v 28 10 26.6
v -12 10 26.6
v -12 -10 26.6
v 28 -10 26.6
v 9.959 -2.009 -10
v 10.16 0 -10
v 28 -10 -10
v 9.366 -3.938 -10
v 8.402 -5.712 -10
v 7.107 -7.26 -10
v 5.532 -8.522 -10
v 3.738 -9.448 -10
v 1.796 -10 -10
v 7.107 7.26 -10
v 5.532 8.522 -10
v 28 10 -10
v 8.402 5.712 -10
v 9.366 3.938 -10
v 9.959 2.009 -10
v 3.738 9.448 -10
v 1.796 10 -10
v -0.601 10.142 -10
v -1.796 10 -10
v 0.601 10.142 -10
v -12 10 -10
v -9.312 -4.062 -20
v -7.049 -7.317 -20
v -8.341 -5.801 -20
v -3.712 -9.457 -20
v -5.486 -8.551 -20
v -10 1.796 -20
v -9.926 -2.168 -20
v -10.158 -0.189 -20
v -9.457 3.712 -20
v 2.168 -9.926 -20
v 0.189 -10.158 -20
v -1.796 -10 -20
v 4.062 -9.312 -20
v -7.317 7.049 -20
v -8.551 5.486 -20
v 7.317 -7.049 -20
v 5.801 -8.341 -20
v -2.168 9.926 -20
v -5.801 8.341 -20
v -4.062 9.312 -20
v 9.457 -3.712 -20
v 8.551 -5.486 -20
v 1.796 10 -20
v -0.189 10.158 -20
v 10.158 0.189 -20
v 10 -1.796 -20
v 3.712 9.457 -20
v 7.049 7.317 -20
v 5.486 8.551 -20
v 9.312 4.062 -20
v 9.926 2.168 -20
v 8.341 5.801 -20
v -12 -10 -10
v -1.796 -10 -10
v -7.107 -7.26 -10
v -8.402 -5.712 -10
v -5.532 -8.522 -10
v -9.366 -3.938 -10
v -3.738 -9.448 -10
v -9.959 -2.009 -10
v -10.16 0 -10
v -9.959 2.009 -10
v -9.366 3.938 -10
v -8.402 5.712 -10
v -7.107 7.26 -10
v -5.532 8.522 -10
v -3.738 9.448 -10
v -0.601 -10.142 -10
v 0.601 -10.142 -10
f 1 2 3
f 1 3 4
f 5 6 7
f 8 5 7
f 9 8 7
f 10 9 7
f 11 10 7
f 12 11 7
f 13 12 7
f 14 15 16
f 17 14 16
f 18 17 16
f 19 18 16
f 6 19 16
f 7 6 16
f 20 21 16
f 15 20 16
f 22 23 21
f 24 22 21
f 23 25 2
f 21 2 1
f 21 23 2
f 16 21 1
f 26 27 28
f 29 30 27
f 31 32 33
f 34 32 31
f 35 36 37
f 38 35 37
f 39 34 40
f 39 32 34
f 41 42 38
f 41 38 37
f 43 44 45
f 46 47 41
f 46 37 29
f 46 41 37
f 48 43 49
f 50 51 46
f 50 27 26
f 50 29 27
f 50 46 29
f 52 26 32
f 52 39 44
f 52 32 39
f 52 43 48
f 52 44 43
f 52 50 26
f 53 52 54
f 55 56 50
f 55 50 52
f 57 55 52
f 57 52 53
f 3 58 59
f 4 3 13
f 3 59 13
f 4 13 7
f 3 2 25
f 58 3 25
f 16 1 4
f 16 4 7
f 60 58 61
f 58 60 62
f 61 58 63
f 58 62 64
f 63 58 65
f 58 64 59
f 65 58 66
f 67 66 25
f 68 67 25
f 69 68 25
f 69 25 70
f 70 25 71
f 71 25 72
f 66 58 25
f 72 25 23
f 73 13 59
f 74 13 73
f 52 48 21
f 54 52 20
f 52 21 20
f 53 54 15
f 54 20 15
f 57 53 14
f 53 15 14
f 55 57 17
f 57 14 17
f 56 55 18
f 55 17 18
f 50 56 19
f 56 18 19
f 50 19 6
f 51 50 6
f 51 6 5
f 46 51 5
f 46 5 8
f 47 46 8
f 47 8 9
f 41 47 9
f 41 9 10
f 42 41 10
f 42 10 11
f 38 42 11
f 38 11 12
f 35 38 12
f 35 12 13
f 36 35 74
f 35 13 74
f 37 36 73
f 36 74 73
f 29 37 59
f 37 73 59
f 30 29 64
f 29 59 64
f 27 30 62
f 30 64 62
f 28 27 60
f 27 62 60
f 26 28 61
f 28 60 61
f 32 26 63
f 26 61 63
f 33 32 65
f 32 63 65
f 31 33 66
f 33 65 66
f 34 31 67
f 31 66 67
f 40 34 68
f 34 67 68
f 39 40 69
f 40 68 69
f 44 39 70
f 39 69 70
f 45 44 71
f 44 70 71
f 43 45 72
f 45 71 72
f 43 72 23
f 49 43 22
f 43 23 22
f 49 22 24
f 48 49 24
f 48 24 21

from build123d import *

# Parameters (mm, degrees)
SKETCH1_W           = 40
SKETCH1_H           = 36.6
BOSS_EXTRUDE1_DEPTH = 10
SKETCH2_R           = 10.16
BOSS_EXTRUDE2_DEPTH = 10


with BuildPart() as part:
    # Sketch1 → Boss-Extrude1 (new, symmetric)
    with BuildSketch(Plane(origin=(0, 0, 0), x_dir=(1, 0, 0), z_dir=(0, 1, 0))):
        with Locations((8, -8.3)):
            Rectangle(SKETCH1_W, SKETCH1_H)
    extrude(amount=BOSS_EXTRUDE1_DEPTH, both=True)

    # Sketch2 → Boss-Extrude2 (add)
    with BuildSketch(Plane(origin=(0, 0, -10), x_dir=(-1, 0, 0), z_dir=(0, 0, -1))):
        with Locations(Location((0, 0, 0), (0, 0, 100.181748388))):
            Circle(SKETCH2_R)
    extrude(amount=BOSS_EXTRUDE2_DEPTH)


solid = part.part
